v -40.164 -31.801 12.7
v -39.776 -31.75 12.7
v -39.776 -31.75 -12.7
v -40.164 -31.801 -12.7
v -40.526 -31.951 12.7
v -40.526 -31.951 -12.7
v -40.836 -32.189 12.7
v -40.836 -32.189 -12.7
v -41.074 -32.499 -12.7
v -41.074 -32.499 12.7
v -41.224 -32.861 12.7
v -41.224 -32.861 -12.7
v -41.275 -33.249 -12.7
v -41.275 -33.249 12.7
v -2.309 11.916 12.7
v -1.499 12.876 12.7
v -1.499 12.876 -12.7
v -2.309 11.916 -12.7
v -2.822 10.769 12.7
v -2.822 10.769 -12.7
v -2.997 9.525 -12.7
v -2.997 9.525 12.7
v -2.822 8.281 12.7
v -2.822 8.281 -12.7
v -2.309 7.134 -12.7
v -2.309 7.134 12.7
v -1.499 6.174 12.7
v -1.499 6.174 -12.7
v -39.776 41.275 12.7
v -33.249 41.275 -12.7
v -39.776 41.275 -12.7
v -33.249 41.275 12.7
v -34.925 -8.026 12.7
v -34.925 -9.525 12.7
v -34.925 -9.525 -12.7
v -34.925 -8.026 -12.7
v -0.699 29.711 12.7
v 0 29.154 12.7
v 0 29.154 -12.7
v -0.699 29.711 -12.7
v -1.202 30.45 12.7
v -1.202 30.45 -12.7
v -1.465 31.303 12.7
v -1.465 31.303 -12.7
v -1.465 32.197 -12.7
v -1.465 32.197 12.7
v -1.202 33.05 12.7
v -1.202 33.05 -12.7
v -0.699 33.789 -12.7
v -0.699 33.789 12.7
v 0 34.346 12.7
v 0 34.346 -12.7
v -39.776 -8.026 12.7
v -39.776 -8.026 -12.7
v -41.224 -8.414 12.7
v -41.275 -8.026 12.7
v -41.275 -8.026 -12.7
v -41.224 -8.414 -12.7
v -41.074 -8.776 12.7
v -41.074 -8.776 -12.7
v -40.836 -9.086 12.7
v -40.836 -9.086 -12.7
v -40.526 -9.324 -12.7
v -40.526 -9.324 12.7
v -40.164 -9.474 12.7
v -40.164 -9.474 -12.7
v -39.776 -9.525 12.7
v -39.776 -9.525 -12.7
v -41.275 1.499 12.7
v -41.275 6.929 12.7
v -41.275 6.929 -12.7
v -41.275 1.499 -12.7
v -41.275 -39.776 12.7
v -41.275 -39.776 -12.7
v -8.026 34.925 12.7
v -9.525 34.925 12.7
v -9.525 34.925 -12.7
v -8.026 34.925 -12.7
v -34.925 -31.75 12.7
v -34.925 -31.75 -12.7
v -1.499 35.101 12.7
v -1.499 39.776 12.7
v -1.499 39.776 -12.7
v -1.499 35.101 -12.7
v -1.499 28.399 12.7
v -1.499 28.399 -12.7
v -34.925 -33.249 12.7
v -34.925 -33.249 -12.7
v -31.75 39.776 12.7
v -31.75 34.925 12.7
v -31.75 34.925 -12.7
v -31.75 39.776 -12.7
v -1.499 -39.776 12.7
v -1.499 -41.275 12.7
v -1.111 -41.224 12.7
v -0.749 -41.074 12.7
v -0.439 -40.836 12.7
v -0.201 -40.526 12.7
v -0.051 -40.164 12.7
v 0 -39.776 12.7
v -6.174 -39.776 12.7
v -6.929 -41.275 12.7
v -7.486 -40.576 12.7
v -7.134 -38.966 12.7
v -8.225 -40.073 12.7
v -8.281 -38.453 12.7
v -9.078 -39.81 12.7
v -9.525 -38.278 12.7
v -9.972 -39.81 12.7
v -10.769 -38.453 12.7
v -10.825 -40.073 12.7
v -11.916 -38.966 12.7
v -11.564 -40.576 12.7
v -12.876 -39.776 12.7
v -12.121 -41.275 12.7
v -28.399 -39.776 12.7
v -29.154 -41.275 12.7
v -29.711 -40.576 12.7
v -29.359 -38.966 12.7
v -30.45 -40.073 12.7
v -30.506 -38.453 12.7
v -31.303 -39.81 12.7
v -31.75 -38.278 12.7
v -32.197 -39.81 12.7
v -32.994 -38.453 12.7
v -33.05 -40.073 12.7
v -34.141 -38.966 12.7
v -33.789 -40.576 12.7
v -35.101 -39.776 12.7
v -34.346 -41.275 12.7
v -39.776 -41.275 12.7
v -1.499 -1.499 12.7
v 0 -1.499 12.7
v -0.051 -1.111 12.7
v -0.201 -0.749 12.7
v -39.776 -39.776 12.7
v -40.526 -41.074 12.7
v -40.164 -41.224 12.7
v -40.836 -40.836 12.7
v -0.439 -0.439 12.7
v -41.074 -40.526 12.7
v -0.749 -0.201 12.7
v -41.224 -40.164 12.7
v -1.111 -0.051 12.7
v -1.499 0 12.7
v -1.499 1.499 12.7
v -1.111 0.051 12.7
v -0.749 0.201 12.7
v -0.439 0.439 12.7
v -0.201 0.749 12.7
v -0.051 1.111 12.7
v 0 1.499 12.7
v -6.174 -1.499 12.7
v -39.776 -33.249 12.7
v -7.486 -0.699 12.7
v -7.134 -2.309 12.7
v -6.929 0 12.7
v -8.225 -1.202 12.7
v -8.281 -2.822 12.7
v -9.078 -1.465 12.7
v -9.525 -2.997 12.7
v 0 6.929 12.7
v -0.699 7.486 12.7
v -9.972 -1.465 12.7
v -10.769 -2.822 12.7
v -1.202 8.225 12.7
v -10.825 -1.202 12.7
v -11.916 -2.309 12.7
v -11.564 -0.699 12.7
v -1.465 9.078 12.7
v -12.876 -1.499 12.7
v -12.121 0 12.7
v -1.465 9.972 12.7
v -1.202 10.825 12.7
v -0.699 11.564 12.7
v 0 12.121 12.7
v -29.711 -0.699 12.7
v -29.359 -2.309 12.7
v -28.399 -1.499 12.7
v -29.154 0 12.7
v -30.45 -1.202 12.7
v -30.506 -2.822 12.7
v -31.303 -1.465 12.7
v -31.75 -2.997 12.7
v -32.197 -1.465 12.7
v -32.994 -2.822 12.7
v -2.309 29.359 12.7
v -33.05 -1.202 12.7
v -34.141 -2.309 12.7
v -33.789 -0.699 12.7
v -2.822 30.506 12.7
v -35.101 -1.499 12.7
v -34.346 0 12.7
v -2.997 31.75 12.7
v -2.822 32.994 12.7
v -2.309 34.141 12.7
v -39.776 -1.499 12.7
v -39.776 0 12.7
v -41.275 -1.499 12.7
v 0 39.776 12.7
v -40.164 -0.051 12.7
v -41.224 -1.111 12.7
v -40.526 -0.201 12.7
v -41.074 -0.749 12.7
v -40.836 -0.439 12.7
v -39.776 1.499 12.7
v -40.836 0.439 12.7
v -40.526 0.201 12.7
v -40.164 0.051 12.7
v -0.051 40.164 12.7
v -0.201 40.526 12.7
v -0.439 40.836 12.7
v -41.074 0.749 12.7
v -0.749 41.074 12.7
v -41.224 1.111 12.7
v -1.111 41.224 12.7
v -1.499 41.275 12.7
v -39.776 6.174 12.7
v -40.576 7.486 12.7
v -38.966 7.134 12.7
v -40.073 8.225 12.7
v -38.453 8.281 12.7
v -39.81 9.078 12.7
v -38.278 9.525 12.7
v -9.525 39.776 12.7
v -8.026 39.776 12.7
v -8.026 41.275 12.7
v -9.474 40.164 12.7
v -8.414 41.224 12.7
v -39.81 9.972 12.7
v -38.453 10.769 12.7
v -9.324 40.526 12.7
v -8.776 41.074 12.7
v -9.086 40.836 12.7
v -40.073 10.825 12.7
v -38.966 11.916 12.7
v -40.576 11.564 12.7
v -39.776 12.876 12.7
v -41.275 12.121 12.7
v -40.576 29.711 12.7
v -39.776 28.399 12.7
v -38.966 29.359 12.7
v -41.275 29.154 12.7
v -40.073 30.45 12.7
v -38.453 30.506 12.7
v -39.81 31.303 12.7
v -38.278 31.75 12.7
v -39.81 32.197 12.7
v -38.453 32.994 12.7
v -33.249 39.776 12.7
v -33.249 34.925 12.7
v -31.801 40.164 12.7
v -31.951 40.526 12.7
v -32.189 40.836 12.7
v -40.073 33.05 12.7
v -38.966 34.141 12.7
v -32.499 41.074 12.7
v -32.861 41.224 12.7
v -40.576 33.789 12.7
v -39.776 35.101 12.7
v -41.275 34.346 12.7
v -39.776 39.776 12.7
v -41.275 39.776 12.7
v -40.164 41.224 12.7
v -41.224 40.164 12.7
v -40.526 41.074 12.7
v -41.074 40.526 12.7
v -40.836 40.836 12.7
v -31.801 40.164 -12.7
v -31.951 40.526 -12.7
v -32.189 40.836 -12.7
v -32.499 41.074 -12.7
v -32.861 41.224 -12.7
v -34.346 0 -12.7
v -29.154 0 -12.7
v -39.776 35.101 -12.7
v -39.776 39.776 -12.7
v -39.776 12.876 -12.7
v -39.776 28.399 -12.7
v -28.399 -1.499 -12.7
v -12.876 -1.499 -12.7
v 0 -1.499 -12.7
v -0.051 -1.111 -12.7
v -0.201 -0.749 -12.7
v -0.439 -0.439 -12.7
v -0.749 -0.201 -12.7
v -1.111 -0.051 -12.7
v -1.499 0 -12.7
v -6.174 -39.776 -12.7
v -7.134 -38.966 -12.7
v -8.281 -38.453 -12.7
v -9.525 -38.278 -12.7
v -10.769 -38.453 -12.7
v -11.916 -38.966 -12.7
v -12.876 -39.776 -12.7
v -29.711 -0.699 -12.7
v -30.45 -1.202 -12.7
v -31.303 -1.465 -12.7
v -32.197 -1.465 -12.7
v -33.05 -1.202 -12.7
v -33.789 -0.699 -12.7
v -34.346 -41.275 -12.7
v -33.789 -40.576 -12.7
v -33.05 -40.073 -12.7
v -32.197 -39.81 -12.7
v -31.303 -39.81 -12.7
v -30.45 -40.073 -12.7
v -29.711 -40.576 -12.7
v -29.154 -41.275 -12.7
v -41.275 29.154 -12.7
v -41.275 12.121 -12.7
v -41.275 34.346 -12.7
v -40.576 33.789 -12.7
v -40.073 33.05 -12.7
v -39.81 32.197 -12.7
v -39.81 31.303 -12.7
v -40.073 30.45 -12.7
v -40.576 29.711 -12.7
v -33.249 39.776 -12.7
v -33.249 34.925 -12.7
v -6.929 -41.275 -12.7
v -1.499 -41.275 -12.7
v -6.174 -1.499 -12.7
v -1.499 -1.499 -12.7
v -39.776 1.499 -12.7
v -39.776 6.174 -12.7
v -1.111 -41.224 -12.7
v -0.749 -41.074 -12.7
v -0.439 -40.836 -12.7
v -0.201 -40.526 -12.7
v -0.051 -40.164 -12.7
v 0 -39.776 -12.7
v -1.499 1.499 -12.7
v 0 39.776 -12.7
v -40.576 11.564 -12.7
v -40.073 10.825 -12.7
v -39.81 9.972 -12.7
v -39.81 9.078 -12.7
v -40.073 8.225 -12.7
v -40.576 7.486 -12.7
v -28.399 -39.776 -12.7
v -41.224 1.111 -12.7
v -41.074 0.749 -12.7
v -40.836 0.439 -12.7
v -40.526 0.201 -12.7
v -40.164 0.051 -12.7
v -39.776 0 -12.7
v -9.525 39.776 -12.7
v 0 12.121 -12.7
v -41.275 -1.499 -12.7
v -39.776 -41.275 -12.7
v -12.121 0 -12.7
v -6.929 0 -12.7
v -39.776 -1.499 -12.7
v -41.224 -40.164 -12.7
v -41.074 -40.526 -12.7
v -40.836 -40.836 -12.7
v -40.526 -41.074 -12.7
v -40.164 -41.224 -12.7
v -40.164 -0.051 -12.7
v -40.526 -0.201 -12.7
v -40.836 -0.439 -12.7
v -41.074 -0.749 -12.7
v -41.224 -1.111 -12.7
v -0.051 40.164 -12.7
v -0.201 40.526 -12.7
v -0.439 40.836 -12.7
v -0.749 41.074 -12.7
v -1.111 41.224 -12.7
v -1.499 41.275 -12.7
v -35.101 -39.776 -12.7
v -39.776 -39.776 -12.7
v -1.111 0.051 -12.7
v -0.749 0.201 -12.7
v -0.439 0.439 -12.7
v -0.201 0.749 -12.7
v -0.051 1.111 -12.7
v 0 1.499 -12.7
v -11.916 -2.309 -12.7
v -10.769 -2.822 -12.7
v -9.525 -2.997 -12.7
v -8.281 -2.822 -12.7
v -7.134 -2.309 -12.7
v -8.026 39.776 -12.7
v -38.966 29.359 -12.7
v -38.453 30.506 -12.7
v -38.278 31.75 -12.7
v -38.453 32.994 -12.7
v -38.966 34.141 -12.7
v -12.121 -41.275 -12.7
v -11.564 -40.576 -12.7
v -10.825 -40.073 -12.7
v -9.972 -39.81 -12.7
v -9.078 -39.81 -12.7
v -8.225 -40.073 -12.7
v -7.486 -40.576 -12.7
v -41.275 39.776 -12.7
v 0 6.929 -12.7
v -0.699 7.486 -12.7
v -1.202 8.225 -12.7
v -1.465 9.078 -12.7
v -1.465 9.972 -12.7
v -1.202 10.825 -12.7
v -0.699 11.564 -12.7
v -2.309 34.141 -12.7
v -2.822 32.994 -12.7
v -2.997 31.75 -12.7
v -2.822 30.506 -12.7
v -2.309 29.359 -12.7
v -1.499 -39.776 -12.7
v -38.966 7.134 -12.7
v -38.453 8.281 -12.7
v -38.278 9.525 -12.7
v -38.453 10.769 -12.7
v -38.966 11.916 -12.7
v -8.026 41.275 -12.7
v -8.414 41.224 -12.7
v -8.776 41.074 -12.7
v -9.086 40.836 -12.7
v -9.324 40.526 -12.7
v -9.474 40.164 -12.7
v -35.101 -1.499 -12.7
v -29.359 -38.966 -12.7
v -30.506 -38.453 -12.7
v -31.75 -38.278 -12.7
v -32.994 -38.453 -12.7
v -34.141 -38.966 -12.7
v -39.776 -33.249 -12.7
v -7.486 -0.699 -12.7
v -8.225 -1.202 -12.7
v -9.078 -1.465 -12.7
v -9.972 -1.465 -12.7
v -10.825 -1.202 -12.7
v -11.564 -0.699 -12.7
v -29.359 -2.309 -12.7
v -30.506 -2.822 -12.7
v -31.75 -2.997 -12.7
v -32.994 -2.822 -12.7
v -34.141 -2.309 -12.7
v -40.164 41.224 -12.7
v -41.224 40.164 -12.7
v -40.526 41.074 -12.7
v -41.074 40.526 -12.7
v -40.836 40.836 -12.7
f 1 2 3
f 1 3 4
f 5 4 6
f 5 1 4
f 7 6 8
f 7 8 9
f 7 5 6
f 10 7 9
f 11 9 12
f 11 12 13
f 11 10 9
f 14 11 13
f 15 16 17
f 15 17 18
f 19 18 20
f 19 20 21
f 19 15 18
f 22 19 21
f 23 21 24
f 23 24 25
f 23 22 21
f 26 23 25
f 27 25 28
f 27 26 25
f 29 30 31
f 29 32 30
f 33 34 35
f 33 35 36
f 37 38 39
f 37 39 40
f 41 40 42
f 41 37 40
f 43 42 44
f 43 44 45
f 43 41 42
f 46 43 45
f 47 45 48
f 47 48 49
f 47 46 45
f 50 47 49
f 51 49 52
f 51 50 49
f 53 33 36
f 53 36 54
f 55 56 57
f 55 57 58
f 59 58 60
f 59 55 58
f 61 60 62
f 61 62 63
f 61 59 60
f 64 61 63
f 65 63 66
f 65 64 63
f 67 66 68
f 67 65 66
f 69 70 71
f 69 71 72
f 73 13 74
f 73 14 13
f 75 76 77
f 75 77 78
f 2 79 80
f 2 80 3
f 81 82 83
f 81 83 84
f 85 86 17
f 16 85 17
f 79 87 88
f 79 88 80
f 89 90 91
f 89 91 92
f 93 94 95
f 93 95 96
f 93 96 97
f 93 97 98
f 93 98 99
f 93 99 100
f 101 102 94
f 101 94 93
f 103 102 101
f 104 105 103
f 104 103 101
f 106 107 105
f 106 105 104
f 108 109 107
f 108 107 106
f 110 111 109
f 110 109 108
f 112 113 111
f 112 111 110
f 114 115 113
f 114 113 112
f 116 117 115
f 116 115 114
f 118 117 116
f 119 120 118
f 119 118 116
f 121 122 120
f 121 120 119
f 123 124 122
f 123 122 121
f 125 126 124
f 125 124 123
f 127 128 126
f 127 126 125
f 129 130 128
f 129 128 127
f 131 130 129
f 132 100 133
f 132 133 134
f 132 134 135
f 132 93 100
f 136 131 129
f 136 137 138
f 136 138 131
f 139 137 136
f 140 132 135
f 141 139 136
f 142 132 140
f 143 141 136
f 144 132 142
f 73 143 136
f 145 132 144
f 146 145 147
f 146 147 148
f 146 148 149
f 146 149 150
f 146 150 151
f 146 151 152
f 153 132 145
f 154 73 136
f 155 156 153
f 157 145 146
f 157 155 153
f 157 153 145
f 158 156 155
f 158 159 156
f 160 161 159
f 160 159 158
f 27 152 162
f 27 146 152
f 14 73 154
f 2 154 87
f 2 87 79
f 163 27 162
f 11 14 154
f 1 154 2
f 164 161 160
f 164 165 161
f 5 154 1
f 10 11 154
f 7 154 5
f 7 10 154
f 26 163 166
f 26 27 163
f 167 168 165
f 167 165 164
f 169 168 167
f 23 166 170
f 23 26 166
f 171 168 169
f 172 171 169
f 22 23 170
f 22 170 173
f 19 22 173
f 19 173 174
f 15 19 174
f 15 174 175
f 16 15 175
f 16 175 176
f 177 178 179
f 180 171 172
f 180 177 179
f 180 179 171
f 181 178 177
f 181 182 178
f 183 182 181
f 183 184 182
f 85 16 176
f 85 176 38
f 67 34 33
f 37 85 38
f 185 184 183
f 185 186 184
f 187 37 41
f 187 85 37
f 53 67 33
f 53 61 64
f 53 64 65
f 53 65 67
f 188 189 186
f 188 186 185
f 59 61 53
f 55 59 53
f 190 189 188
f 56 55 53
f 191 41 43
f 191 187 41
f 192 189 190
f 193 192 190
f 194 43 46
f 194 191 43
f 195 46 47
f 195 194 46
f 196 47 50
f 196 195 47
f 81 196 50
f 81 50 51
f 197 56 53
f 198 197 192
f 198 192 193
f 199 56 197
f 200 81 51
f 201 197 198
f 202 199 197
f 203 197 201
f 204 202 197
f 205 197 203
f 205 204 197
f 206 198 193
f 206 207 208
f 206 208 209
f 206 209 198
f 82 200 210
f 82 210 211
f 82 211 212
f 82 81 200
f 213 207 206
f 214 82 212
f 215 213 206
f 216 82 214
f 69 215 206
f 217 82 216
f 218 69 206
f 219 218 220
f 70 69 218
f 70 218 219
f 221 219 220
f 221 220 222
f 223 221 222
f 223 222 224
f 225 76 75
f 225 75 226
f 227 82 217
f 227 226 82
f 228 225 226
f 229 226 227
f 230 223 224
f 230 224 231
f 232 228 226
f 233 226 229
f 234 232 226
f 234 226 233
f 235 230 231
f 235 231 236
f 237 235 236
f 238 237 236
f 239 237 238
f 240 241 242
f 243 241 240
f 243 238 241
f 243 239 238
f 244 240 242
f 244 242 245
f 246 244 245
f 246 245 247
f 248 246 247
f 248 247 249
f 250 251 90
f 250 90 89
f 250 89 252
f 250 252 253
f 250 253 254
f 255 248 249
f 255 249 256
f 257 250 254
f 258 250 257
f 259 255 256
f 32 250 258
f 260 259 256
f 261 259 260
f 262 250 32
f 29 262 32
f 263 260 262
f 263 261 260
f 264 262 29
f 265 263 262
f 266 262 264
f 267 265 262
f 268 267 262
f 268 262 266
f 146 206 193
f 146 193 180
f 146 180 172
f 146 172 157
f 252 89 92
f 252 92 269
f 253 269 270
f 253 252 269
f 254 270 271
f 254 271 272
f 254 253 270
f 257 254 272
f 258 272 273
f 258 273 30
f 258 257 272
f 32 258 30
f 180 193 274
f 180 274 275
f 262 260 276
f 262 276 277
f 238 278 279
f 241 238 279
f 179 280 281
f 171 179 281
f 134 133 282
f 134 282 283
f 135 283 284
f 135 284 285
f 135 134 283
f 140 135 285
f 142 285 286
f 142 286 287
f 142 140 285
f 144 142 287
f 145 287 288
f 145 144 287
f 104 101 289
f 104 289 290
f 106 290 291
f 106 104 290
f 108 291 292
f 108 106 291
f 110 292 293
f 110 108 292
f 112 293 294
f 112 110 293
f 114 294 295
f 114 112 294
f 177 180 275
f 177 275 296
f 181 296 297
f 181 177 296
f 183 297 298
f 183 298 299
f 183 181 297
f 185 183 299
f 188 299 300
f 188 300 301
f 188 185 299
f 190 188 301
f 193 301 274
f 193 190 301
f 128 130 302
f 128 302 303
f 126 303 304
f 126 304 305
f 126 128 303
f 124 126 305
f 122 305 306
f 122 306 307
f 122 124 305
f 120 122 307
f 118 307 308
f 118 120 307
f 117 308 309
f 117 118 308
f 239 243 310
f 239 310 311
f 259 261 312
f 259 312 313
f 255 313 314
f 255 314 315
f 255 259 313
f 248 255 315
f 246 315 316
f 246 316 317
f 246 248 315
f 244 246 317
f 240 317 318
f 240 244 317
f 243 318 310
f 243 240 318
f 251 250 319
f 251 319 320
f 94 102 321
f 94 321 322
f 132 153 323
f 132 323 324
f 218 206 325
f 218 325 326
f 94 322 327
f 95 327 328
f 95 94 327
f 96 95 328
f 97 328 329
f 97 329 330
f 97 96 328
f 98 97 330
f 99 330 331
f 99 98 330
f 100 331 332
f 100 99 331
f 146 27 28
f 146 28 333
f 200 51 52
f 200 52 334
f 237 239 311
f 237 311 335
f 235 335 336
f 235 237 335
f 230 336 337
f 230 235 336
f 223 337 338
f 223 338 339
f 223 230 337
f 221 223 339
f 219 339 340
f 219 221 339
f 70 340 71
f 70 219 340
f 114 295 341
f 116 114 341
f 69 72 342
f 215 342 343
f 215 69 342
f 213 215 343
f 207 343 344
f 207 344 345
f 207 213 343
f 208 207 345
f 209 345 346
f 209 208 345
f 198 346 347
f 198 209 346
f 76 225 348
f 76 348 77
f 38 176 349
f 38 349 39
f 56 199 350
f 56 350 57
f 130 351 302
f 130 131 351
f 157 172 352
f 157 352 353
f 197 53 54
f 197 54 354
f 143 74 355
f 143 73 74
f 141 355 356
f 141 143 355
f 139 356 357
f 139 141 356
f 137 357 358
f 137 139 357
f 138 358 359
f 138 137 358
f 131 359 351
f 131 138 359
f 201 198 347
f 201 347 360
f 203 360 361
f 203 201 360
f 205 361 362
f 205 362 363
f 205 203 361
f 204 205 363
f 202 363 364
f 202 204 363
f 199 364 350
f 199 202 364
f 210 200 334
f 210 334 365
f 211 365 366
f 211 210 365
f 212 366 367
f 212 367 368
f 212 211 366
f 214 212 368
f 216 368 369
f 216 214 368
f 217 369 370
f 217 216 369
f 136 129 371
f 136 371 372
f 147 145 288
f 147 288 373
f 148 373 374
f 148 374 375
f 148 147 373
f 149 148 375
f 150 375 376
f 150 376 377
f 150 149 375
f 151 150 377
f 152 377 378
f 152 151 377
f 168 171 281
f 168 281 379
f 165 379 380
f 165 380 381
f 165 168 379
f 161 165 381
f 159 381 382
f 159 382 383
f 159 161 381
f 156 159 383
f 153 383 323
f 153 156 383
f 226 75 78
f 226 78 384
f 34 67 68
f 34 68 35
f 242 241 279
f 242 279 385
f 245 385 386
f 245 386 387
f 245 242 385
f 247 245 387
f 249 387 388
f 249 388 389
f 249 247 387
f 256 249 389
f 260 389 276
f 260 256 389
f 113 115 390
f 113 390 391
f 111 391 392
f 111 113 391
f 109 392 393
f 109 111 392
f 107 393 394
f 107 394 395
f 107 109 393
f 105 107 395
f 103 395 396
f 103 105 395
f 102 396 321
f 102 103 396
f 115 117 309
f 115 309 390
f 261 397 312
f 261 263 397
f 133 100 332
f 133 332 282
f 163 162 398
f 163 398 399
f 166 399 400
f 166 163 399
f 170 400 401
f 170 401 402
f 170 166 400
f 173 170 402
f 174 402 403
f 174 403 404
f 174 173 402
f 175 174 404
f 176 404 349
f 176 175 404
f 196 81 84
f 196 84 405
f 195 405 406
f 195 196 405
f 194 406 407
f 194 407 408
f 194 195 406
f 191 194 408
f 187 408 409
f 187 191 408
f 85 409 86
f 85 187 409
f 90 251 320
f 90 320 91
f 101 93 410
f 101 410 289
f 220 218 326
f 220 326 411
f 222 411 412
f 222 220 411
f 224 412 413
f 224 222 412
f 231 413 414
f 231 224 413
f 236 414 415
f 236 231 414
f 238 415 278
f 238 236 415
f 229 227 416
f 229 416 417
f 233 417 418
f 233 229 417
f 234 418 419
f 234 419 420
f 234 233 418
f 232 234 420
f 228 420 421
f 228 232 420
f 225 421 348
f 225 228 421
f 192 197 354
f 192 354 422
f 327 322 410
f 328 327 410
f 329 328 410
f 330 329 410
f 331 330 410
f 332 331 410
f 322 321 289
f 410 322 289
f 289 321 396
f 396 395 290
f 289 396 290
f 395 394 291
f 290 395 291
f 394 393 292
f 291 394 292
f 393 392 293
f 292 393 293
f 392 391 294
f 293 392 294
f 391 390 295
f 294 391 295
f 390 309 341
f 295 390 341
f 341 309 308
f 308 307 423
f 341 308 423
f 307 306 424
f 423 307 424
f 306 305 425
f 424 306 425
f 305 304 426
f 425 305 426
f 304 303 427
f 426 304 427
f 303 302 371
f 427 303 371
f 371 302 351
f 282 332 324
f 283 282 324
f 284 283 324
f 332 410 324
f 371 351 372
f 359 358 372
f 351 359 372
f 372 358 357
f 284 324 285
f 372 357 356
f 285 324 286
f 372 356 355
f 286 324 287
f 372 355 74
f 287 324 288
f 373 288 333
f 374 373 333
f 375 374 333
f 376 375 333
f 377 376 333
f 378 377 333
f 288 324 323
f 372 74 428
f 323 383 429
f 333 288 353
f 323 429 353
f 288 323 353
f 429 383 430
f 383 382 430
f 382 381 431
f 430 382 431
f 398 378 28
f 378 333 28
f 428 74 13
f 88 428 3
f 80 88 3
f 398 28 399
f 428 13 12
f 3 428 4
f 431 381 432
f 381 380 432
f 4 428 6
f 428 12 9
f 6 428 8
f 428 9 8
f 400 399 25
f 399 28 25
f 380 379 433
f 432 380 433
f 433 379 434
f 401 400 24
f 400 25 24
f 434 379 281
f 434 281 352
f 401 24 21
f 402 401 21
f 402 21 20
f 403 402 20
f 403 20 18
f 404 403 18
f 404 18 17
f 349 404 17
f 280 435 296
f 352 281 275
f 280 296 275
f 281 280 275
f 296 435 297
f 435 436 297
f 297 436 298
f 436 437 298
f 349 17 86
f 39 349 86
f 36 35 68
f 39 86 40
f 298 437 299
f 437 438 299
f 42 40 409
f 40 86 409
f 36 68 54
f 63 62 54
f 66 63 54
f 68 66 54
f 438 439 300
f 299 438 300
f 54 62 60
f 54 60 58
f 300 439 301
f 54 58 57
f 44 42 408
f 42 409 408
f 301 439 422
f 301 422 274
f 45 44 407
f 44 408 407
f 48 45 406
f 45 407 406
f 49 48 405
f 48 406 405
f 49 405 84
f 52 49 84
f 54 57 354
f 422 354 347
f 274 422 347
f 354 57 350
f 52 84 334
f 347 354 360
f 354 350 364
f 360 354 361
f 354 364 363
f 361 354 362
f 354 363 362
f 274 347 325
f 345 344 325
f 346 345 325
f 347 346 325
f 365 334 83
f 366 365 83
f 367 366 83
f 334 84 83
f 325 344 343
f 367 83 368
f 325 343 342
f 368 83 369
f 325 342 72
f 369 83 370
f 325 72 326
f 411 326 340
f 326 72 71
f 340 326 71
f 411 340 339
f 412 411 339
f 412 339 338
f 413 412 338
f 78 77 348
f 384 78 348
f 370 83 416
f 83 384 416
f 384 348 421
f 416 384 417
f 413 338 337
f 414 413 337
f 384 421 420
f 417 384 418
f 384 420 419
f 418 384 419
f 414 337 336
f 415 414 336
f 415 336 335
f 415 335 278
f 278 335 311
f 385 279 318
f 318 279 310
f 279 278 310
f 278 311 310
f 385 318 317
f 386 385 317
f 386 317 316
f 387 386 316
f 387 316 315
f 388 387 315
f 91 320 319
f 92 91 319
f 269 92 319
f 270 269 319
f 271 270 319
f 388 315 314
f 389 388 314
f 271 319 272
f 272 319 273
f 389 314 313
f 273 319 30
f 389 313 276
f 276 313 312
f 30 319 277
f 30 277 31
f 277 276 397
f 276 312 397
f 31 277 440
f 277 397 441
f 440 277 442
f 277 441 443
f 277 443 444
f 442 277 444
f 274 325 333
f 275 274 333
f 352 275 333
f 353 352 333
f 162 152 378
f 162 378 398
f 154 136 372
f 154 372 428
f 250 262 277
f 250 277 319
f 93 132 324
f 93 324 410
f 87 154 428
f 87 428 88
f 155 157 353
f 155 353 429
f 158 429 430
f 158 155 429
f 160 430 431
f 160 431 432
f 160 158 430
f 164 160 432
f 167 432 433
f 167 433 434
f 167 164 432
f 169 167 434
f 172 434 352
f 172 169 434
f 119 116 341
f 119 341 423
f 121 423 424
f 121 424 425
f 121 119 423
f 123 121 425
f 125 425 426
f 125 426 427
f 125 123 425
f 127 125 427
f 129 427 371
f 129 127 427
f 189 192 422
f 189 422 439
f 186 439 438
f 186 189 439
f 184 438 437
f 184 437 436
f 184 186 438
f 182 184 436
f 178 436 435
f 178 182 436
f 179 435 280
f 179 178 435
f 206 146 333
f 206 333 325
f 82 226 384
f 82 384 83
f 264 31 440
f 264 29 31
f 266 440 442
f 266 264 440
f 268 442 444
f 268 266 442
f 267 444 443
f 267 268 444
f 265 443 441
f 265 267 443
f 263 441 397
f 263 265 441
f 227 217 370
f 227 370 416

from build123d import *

# Parameters (mm, degrees)
BASE_EXTRUDE_DEPTH = 12.7
CIRPATTERN1_COUNT  = 2
CIRPATTERN1_ANGLE  = 90


with BuildPart() as part:
    # Sketch1 → Base-Extrude (new, symmetric)
    with BuildSketch(Plane.XY):
        with BuildLine():
            Line((-41.275, 39.7764), (-41.275, 34.34565134))
            ThreePointArc((-41.275, 34.34565134), (-39.7764, 31.75), (-41.275, 29.15434866))
            Line((-41.275, 29.15434866), (-41.275, 12.12065134))
            ThreePointArc((-41.275, 12.12065134), (-39.7764, 9.525), (-41.275, 6.92934866))
            Line((-41.275, 6.92934866), (-41.275, 1.4986))
            ThreePointArc((-41.275, 1.4986), (-40.836070222, 0.438929778), (-39.7764, 0))
            Line((-39.7764, 0), (-1.4986, 0))
            ThreePointArc((-1.4986, 0), (-0.438929778, 0.438929778), (0, 1.4986))
            Line((0, 1.4986), (0, 6.92934866))
            ThreePointArc((0, 6.92934866), (-1.4986, 9.525), (0, 12.12065134))
            Line((0, 12.12065134), (0, 29.15434866))
            ThreePointArc((0, 29.15434866), (-1.4986, 31.75), (0, 34.34565134))
            Line((0, 34.34565134), (0, 39.7764))
            ThreePointArc((0, 39.7764), (-0.438929778, 40.836070222), (-1.4986, 41.275))
            Line((-1.4986, 41.275), (-8.0264, 41.275))
            ThreePointArc((-8.0264, 41.275), (-9.086070222, 40.836070222), (-9.525, 39.7764))
            Line((-9.525, 39.7764), (-9.525, 34.925))
            Line((-9.525, 34.925), (-8.0264, 34.925))
            Line((-8.0264, 34.925), (-8.0264, 39.7764))
            Line((-8.0264, 39.7764), (-1.4986, 39.7764))
            Line((-1.4986, 39.7764), (-1.4986, 35.100971471))
            ThreePointArc((-1.4986, 35.100971471), (-2.9972, 31.75), (-1.4986, 28.399028529))
            Line((-1.4986, 28.399028529), (-1.4986, 12.875971471))
            ThreePointArc((-1.4986, 12.875971471), (-2.9972, 9.525), (-1.4986, 6.174028529))
            Line((-1.4986, 6.174028529), (-1.4986, 1.4986))
            Line((-1.4986, 1.4986), (-39.7764, 1.4986))
            Line((-39.7764, 1.4986), (-39.7764, 6.174028529))
            ThreePointArc((-39.7764, 6.174028529), (-38.2778, 9.525), (-39.7764, 12.875971471))
            Line((-39.7764, 12.875971471), (-39.7764, 28.399028529))
            ThreePointArc((-39.7764, 28.399028529), (-38.2778, 31.75), (-39.7764, 35.100971471))
            Line((-39.7764, 35.100971471), (-39.7764, 39.7764))
            Line((-39.7764, 39.7764), (-33.2486, 39.7764))
            Line((-33.2486, 39.7764), (-33.2486, 34.925))
            Line((-33.2486, 34.925), (-31.75, 34.925))
            Line((-31.75, 34.925), (-31.75, 39.7764))
            ThreePointArc((-31.75, 39.7764), (-32.188929778, 40.836070222), (-33.2486, 41.275))
            Line((-33.2486, 41.275), (-39.7764, 41.275))
            ThreePointArc((-39.7764, 41.275), (-40.836070222, 40.836070222), (-41.275, 39.7764))
        make_face()
    base_extrude = extrude(amount=BASE_EXTRUDE_DEPTH, both=True)

    # CirPattern1: Base-Extrude ×2 about axis
    cirpattern1_axis = Axis((0, 0, 0), (0, 0, 1))
    for i in range(1, CIRPATTERN1_COUNT):
        add(base_extrude.rotate(cirpattern1_axis, i * CIRPATTERN1_ANGLE / (CIRPATTERN1_COUNT - 1)))


solid = part.part
